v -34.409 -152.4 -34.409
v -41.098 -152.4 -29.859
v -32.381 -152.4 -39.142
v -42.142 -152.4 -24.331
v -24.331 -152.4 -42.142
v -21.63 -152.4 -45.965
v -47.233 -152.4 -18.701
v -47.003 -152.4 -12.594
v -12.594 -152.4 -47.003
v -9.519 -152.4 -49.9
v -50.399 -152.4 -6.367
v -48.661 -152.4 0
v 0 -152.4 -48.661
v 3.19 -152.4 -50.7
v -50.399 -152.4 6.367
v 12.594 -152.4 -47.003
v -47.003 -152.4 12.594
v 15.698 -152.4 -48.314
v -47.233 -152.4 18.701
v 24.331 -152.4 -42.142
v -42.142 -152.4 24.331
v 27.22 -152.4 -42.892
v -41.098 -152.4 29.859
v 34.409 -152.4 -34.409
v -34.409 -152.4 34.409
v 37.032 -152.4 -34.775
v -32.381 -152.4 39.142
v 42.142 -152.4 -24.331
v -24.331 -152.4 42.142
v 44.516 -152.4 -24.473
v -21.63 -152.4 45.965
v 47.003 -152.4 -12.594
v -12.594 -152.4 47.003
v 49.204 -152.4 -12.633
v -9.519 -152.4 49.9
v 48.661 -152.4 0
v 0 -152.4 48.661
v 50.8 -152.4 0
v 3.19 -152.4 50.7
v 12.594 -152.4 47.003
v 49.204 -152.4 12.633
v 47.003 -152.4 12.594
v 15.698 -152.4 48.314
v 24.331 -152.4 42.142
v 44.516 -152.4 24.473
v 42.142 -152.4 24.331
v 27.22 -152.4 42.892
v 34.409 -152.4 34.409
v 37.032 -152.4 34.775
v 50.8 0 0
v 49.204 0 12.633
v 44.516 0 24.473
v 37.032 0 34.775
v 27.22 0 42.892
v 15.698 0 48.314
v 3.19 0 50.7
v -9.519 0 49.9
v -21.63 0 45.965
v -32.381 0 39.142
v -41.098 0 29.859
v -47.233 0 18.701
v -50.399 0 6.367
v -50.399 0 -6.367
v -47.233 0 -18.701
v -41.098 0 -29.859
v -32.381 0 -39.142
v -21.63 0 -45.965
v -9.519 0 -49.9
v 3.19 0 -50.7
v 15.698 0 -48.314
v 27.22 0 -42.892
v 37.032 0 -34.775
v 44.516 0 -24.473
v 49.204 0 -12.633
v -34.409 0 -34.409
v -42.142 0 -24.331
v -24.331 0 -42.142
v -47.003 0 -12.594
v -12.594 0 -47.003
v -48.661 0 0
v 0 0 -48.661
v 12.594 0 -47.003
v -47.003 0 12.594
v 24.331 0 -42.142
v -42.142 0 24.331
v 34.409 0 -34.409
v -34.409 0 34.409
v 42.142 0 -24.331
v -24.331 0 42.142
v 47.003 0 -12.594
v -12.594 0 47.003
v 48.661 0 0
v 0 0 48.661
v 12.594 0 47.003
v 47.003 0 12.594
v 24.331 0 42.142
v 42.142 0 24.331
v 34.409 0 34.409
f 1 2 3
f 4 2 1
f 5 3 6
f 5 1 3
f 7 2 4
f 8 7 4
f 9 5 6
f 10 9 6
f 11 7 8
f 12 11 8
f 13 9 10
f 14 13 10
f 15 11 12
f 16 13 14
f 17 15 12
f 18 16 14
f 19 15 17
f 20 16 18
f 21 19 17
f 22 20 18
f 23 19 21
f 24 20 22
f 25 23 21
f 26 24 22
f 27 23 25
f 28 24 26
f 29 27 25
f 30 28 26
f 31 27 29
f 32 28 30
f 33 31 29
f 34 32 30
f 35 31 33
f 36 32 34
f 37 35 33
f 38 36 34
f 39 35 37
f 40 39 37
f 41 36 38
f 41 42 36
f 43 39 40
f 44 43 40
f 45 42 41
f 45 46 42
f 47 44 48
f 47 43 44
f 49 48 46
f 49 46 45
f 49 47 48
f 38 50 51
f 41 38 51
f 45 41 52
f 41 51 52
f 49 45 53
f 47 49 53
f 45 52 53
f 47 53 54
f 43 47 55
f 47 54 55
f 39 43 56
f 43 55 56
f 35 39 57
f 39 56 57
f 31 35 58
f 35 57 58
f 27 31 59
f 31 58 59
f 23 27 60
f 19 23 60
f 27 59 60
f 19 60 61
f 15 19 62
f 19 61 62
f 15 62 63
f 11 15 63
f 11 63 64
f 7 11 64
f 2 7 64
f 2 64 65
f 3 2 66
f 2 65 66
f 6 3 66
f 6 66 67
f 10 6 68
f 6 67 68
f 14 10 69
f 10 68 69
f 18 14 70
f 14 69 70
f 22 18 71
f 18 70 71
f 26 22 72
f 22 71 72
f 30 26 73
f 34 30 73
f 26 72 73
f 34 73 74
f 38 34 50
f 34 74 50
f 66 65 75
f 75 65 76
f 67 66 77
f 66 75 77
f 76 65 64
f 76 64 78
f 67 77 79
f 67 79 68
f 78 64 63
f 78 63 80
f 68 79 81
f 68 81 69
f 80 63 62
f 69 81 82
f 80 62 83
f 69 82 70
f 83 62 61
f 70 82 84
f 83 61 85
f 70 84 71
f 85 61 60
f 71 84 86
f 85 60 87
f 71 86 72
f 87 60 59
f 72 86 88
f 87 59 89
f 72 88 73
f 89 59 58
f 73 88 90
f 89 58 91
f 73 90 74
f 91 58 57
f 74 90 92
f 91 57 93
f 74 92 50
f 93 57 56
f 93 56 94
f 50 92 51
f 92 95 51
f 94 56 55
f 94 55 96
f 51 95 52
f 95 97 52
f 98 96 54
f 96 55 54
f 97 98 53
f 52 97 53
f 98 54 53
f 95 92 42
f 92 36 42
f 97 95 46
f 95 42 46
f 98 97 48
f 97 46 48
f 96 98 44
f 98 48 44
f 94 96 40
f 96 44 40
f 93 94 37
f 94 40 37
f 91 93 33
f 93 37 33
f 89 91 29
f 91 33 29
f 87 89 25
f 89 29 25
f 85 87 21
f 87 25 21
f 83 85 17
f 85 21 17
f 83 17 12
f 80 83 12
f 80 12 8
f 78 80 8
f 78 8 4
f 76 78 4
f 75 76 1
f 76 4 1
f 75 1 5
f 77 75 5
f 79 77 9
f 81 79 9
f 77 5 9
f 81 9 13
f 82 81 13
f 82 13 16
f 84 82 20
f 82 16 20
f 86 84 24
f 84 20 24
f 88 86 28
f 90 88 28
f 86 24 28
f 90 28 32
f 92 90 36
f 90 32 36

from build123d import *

# Parameters (mm, degrees)
F0_R      = 50.8
F1_DEPTH  = 152.4
F2_R      = 48.661365
F3_DEPTH  = 139.7
F3_FACE_R = 48.661365
F4_DEPTH  = 139.7


with BuildPart() as f1:
    # F0 (on Front) → F1 (new body)
    with BuildSketch(Plane.XZ):
        Circle(F0_R)
    extrude(amount=F1_DEPTH)

    # F2 (on face) → F3 (cut)
    with BuildSketch(Plane.XZ.offset(152.4)):
        Circle(F2_R)
    extrude(amount=-F3_DEPTH, mode=Mode.SUBTRACT)

    # F2 (on face) + F3_face (on face) → F4 (cut)
    with BuildSketch(Plane.XZ.offset(152.4)):
        Circle(F2_R)
    with BuildSketch(Plane.XZ.offset(12.7)):
        Circle(F3_FACE_R)
    extrude(amount=-F4_DEPTH, mode=Mode.SUBTRACT)


solid = f1.part
